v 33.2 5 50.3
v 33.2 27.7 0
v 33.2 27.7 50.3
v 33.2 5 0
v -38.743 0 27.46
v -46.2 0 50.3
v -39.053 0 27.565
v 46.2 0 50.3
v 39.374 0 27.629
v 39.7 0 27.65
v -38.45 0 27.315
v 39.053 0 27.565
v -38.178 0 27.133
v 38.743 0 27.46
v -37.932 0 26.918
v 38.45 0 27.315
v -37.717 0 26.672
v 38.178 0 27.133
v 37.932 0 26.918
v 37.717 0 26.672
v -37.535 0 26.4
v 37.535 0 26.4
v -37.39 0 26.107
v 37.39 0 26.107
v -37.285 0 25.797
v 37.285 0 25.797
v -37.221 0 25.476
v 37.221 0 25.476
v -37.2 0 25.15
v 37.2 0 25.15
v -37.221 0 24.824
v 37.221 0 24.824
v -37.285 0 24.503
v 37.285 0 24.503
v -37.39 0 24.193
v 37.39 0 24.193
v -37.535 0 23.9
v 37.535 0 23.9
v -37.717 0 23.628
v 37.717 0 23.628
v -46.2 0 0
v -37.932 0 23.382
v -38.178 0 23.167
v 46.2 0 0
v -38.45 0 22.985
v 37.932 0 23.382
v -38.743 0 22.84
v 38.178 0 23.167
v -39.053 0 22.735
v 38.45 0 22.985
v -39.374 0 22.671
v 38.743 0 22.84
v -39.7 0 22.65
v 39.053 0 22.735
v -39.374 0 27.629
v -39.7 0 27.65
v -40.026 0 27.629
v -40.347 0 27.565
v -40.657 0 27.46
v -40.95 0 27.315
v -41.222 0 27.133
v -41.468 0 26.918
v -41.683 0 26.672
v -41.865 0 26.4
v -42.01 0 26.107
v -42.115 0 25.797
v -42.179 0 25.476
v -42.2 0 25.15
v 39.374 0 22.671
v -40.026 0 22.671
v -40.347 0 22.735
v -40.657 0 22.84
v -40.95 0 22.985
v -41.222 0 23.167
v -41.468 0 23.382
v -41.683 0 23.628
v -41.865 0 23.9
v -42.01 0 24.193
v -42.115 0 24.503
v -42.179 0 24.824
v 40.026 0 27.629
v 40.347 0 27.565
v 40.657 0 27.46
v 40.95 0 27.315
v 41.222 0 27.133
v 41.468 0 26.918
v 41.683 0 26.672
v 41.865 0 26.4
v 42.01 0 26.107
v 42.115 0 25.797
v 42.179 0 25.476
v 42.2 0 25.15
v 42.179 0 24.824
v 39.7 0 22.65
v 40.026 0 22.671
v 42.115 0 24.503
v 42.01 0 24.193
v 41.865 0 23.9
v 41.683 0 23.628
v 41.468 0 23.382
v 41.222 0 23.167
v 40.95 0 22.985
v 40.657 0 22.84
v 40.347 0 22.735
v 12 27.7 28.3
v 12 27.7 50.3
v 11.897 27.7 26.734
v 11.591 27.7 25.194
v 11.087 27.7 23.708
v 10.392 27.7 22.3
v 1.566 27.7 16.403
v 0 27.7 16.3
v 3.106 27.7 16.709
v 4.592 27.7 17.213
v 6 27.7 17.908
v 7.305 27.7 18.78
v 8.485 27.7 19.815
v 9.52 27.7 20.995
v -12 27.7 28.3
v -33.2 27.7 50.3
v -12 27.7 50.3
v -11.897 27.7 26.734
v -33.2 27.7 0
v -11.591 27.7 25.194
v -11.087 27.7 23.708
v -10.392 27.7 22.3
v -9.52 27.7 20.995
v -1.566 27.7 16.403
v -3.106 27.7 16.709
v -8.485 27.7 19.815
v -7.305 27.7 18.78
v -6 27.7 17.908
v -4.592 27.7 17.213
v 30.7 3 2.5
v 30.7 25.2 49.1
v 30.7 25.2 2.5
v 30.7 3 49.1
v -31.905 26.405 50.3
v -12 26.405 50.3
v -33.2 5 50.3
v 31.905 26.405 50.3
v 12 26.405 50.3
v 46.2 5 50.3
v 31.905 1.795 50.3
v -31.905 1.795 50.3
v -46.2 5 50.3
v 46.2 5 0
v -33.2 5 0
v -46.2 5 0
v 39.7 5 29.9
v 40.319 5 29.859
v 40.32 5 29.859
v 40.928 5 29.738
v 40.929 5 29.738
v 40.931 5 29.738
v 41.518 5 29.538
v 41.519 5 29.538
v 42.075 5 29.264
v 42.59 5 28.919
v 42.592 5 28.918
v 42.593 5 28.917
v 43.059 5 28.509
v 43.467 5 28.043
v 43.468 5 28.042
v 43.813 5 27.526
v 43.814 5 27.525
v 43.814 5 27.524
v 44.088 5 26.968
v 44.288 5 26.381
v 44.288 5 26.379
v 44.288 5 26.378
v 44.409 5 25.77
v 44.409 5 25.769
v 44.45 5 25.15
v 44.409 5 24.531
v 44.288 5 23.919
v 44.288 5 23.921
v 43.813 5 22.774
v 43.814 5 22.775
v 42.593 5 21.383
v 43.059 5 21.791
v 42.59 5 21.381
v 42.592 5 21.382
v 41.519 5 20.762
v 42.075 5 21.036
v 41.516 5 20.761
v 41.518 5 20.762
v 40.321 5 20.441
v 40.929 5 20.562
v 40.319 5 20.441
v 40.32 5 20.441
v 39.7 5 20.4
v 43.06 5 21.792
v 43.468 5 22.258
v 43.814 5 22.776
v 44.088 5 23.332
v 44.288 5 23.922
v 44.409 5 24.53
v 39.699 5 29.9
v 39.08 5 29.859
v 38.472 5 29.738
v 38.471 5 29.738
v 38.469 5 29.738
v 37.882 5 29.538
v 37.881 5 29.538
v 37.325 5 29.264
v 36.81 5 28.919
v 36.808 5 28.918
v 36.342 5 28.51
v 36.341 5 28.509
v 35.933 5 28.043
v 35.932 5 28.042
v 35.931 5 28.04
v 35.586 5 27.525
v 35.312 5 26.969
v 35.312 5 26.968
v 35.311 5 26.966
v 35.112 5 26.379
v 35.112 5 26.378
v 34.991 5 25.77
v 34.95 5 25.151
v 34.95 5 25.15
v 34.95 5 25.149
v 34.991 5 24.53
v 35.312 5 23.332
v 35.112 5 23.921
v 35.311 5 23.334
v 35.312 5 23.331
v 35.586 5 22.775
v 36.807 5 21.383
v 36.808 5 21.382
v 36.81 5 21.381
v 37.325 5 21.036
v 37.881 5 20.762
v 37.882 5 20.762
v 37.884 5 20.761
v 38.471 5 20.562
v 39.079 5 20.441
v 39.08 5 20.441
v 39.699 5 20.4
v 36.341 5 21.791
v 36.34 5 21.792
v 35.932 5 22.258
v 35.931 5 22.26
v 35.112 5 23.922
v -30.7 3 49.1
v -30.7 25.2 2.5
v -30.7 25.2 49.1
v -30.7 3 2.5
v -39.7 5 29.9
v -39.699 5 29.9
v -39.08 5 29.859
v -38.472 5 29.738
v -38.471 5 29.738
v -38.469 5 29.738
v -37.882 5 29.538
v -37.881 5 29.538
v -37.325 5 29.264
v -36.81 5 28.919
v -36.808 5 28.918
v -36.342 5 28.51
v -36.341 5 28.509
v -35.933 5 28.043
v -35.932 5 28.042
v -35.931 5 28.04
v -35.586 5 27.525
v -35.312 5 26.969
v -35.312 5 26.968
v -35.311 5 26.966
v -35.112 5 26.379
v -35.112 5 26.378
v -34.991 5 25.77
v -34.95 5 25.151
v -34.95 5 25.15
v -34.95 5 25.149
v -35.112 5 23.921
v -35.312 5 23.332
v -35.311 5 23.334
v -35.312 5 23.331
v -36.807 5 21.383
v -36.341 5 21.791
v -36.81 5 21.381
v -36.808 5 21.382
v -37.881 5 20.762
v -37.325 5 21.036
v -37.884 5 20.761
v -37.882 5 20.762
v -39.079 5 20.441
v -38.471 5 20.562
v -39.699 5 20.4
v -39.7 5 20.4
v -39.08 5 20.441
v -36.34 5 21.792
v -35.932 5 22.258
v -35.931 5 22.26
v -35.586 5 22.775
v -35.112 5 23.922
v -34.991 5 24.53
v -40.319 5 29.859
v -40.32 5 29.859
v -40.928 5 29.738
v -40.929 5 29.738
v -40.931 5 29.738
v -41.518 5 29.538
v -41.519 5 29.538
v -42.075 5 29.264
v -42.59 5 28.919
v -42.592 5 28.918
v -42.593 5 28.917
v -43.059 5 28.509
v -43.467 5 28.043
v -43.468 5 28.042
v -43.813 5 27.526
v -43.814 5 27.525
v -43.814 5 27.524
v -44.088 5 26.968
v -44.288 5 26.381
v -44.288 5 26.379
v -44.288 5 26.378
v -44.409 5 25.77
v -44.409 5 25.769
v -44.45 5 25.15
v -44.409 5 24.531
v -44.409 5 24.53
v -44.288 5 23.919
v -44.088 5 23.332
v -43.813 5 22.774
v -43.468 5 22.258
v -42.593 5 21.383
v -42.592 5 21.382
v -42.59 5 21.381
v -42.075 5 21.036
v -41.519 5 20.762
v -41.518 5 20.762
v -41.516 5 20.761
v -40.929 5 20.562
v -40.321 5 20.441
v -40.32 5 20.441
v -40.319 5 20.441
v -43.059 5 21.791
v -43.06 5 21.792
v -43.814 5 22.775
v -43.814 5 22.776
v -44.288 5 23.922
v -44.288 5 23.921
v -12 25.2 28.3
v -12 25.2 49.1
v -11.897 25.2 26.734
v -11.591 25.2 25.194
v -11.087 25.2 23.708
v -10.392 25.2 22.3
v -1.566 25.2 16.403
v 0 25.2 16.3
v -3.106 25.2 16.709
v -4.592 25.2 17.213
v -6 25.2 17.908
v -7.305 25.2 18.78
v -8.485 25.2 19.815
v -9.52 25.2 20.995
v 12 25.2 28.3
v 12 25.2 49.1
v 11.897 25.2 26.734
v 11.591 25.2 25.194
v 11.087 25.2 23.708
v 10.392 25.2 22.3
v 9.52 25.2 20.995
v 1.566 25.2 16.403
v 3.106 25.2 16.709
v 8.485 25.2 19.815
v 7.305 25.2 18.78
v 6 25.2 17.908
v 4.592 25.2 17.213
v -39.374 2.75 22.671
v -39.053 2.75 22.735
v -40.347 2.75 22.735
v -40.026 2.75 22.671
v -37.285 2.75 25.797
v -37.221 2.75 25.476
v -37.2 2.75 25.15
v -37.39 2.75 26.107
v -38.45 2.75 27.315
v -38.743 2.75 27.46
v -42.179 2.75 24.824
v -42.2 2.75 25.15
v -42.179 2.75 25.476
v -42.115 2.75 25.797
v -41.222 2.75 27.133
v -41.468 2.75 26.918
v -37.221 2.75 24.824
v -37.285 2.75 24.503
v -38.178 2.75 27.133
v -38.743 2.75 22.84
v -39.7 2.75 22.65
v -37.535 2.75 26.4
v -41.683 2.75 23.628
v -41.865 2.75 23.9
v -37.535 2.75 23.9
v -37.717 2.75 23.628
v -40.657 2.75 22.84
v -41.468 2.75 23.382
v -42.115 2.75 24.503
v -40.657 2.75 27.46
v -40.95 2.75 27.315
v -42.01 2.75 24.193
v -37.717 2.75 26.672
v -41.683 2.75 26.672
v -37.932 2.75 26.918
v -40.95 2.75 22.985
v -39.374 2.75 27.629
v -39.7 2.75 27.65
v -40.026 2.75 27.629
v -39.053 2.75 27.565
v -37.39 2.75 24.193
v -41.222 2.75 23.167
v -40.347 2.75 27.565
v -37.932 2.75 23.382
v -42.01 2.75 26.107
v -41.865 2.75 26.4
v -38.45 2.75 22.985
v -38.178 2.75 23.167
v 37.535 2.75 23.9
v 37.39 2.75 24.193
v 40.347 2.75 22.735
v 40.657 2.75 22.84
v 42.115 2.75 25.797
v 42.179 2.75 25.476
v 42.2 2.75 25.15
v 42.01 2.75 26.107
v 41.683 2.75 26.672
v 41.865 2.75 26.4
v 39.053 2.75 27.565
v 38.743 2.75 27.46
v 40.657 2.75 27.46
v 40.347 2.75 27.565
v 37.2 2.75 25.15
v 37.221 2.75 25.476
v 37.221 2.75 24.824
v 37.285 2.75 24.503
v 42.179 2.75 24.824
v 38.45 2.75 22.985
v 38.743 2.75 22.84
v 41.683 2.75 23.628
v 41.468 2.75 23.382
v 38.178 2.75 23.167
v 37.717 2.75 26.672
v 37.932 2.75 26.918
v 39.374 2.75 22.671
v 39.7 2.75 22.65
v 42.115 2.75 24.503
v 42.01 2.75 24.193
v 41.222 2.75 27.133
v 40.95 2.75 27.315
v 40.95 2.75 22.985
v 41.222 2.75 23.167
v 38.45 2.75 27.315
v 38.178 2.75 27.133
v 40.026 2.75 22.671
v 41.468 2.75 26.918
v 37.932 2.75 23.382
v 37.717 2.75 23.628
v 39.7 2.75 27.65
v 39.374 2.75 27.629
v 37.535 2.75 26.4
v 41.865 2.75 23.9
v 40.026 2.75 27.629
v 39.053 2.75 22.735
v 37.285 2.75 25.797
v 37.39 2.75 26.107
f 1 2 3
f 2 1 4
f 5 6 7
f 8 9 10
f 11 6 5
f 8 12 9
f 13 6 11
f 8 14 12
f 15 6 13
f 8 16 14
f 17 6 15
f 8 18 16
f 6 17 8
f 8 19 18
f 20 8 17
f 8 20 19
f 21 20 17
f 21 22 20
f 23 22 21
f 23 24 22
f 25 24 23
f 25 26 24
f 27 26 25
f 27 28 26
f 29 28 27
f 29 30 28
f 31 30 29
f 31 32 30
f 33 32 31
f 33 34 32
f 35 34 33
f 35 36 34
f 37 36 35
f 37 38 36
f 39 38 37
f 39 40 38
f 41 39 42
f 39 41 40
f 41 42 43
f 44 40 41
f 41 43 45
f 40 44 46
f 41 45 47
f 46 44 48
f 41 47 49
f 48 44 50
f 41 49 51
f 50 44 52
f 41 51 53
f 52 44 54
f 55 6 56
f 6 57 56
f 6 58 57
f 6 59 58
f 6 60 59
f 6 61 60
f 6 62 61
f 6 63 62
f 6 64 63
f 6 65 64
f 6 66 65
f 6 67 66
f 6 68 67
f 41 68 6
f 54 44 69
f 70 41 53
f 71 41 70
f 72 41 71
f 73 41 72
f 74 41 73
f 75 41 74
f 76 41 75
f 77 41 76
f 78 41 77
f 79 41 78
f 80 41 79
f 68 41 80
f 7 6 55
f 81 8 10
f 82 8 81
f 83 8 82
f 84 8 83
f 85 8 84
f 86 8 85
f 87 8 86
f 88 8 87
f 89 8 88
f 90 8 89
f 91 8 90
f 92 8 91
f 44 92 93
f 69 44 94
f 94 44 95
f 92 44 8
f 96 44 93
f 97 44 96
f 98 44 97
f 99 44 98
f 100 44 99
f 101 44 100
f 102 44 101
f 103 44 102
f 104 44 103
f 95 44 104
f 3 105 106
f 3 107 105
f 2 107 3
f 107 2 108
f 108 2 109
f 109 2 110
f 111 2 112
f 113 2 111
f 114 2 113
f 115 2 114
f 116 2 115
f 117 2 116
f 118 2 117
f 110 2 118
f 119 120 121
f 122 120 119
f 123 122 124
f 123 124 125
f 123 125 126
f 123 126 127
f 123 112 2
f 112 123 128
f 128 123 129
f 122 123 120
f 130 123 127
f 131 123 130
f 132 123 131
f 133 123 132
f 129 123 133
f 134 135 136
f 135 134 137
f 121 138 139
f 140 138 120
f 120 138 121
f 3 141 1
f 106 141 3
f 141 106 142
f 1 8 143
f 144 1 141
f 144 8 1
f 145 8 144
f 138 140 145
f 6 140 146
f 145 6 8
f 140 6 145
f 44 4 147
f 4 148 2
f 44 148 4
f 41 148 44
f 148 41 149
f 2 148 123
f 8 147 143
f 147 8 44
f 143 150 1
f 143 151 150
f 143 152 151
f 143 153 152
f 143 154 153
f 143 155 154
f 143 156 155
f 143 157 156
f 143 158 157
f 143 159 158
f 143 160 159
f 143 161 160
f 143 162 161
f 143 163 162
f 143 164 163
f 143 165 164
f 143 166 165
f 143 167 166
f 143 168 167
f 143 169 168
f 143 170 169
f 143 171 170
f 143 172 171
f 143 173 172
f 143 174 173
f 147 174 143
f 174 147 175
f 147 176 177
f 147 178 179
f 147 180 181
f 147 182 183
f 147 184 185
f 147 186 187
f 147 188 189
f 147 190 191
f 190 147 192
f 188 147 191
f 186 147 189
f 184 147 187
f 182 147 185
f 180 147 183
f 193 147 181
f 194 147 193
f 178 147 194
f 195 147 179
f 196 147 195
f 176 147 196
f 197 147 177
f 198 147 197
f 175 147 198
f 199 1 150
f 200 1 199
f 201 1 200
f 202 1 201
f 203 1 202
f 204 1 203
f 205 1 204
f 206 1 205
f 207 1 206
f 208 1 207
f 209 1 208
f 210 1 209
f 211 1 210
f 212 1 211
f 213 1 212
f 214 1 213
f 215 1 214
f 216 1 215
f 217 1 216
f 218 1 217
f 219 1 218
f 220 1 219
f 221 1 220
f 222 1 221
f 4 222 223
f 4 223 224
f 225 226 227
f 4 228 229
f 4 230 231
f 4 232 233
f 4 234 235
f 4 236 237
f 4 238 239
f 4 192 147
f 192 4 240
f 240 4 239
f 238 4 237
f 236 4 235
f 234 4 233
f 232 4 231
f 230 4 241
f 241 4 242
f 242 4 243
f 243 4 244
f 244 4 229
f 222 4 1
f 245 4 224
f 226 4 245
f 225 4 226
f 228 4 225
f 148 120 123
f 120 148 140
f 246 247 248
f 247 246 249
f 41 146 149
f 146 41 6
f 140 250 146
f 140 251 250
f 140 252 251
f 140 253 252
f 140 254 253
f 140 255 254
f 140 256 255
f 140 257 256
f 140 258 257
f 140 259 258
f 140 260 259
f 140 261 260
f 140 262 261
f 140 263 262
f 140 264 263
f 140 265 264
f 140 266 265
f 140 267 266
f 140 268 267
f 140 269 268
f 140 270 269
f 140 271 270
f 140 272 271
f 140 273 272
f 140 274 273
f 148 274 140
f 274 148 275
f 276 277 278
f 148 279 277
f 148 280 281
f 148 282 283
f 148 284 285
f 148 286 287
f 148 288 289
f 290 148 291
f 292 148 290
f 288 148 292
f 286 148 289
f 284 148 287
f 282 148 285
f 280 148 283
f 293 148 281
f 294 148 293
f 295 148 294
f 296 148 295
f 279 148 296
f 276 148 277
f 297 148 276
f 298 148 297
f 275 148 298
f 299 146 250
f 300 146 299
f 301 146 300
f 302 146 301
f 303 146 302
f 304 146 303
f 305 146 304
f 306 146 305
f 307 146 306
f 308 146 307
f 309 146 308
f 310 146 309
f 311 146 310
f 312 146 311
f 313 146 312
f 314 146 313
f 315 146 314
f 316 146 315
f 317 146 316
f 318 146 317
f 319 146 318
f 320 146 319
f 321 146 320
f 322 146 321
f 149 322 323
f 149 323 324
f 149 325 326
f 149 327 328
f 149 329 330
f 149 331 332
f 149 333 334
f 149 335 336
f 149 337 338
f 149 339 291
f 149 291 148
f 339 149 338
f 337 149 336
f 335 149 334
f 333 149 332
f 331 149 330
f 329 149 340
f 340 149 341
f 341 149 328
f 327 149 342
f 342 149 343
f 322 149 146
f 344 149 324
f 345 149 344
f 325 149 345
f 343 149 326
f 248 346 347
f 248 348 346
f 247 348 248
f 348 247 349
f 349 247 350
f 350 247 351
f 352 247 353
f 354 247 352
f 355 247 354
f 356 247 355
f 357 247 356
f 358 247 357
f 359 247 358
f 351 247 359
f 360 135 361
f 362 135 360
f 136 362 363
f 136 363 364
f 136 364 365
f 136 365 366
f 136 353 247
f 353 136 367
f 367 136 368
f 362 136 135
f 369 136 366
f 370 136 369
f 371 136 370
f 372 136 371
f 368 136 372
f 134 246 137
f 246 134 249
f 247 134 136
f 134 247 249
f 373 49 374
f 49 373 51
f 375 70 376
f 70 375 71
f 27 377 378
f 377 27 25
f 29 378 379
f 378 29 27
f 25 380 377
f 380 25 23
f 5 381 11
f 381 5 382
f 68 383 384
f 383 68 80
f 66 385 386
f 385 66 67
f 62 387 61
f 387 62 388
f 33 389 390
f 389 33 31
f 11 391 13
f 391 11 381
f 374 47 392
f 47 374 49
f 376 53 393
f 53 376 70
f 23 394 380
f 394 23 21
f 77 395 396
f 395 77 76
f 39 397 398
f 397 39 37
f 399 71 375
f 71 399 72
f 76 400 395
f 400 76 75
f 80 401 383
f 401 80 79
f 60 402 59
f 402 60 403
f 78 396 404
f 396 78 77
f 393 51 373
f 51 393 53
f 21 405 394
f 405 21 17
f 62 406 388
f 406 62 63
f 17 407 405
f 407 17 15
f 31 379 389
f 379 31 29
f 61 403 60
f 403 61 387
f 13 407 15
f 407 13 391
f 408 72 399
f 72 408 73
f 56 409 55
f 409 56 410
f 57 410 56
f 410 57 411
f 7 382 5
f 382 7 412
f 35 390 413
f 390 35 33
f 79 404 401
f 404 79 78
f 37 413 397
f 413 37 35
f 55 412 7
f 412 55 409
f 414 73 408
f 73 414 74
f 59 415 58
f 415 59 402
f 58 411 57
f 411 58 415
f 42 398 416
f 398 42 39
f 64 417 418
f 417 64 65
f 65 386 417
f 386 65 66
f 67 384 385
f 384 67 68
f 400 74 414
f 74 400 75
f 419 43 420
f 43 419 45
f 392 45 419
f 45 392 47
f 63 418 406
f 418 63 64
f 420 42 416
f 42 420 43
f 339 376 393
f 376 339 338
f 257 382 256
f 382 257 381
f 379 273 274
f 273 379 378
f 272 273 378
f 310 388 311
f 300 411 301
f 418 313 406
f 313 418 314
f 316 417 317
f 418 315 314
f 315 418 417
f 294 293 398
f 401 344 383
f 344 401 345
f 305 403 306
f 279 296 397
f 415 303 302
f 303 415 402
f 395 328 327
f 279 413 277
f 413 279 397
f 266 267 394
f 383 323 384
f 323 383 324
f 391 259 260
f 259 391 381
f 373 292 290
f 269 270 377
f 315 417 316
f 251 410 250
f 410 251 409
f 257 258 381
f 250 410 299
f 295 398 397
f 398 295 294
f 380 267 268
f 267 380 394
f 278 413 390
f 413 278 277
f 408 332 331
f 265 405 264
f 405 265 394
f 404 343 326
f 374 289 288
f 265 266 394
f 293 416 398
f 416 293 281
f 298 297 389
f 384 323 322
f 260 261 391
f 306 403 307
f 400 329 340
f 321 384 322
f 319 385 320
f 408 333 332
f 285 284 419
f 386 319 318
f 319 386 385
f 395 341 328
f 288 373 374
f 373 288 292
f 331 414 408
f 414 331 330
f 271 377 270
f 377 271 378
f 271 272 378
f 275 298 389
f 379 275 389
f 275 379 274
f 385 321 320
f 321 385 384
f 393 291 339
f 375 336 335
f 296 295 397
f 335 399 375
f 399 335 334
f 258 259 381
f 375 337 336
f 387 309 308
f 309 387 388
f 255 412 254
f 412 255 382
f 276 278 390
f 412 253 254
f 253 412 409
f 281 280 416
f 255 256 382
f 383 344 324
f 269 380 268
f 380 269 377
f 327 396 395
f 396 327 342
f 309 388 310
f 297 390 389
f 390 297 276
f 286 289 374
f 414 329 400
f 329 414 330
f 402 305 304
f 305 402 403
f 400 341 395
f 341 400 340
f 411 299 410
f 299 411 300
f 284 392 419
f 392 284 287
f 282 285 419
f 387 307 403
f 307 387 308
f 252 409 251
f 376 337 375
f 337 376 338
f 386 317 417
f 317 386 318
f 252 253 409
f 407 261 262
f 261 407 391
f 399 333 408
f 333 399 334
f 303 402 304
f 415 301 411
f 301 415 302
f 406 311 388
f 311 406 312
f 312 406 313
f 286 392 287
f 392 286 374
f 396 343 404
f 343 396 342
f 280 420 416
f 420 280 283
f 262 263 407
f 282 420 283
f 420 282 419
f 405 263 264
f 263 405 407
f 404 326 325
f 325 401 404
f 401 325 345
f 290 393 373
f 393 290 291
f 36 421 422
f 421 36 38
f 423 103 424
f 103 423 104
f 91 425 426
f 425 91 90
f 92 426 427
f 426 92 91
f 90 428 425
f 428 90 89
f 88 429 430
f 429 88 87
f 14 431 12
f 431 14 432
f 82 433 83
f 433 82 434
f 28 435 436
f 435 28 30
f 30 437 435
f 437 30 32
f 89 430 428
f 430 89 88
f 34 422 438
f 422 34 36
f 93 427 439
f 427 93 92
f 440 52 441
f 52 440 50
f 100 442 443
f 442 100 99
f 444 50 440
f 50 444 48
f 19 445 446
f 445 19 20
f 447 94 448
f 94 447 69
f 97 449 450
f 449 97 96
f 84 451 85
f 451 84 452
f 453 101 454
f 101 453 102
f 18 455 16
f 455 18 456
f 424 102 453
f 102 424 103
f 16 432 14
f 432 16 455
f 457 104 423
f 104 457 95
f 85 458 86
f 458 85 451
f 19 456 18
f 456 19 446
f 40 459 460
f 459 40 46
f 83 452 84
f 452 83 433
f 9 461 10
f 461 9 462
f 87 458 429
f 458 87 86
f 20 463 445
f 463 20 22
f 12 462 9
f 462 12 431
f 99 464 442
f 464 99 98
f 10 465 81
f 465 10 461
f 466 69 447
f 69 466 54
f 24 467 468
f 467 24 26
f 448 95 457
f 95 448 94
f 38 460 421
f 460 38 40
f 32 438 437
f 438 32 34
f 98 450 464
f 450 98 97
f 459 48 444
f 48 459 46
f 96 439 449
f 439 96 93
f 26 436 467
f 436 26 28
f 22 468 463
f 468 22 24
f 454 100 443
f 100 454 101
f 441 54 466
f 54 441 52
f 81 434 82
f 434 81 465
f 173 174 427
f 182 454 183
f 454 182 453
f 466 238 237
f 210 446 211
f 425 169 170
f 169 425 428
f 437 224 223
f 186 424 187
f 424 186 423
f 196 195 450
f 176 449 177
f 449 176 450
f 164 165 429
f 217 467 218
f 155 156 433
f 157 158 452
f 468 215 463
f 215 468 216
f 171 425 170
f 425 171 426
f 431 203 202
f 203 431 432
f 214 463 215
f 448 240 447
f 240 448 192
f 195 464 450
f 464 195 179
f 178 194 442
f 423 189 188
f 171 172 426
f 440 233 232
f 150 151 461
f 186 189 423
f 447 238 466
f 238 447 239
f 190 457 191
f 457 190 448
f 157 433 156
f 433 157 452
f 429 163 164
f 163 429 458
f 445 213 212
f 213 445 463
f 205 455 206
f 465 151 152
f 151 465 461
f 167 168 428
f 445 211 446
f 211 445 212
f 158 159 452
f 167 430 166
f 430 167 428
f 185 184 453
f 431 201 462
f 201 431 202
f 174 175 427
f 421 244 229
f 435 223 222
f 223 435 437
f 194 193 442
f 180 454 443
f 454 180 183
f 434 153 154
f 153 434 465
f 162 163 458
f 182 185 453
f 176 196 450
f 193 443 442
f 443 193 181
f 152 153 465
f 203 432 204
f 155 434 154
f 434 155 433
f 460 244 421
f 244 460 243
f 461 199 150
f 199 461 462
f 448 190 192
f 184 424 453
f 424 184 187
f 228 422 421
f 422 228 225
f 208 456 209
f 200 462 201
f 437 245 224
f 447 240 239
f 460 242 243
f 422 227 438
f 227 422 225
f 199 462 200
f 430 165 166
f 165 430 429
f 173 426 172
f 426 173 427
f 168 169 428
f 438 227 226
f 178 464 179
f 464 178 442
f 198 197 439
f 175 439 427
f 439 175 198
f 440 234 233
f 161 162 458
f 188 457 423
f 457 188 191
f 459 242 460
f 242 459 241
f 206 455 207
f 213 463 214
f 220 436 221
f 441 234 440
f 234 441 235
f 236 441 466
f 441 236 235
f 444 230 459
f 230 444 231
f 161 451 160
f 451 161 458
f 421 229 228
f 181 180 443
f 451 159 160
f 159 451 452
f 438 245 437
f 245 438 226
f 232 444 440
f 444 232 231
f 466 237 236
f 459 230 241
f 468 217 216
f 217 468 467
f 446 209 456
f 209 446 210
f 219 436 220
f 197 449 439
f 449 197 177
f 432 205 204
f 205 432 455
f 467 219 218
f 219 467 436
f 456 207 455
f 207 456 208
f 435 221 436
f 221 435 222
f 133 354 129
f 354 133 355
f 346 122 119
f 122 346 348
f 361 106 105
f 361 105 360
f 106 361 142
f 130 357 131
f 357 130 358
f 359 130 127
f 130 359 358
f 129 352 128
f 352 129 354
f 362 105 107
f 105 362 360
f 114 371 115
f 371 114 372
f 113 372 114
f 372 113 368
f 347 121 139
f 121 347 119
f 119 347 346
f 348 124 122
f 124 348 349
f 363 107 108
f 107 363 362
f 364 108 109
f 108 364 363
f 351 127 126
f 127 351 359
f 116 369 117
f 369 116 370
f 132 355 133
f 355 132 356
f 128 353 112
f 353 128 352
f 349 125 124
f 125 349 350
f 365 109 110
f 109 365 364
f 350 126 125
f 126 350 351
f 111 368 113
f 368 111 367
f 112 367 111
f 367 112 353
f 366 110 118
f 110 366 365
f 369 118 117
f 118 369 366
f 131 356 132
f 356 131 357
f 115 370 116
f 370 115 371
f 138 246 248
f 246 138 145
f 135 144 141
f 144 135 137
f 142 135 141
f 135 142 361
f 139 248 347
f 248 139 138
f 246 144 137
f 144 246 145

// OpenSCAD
// ---------------------------------------------------------------------------
// Under-desk AirPods Pro case tray
//
// A shallow open-front tray that screws to the underside of a desk. The case
// lies flat, big face to the desk, and slides in and out from the front. A
// thumb notch in the floor at the mouth lets you push it back out.
//
// Lying flat is what makes this simple. Stood on end the case would have to be
// held up against gravity, which needs a snap, and a shallow socket has no
// wall length to spring with. Flat, the floor does the work and there is
// nothing to latch.
//
// Apple publishes the case as 45.2 x 60.6 x 21.7 mm but not its radii. Lying
// flat that hardly matters - a square pocket takes the case whatever its
// corners do, and the only place it shows is that the case rests on the flat
// middle of its face rather than right out at the edges, which is why the
// floor is solid rather than a pair of shelves.
//
//   x = case width, y = depth front to back, z = height, 0 = desk underside
//
// Render:  openscad -o tray.stl under_desk_airpods_holder.scad
// ---------------------------------------------------------------------------

/* [Case] Apple AirPods Pro 2 charging case, lying flat */
CASE_W = 60.6;           // left-right
CASE_D = 45.2;           // front-back once it is lying down
CASE_T = 21.7;           // thickness, which is now the depth of the tray

/* [Fit] */
GAP_SIDE = 0.4;          // snug: the case is a known size, so this can be tight
GAP_TOP  = 0.5;
GAP_BACK = 0.6;

/* [Tray] */
WALL      = 2.5;
TOP_T     = 3.0;         // the face that beds against the desk
FLOOR_T   = 2.5;         // solid: the case's face is only flat in the middle
BACK_T    = 2.5;
FRONT_LIP = 2.0;
NOTCH_W   = 24.0;        // thumb slot in the floor. Wide enough for a thumb, and
NOTCH_L   = 34.0;        // long enough to run it back behind the case and drag
                         // the case out. It costs floor: what is left either
                         // side of it is what the case actually rests on.
CHAMFER   = 1.2;         // lead-in around the mouth

/* [Mounting pads] Two, one per side, full depth. Outboard so a driver can get
   at the screws from below without reaching into the tray. */
EAR_L = 13.0;
EAR_T = 5.0;

/* [Fasteners] Two #8 or M4 flat-head wood screws */
SCREW_D    = 5.0;
HEAD_D     = 9.5;
CSK_ANGLE  = 90.0;
DRIVER_CLR = 1.5;

/* [Output] */
PRINT_ORIENTATION = true;    // laid on its back face, which is how it prints
SHOW_CASE = false;
$fn = 48;

// --------------------------- derived --------------------------------------

CAV_W = CASE_W + 2 * GAP_SIDE;
CAV_T = CASE_T + GAP_TOP;
OUT_W = CAV_W + 2 * WALL;
OUT_D = BACK_T + CASE_D + GAP_BACK + FRONT_LIP;
OUT_H = TOP_T + CAV_T + FLOOR_T;

X_CAV = CAV_W / 2;
X_OUT = OUT_W / 2;
X_EAR = X_OUT + EAR_L;
SCREW_X = X_OUT + EAR_L / 2;
SCREW_Y = OUT_D / 2;

Z_FLOOR = -(TOP_T + CAV_T);      // floor's top face = where the case rests
Z_BOT   = -OUT_H;
CSK_DEPTH = (HEAD_D - SCREW_D) / 2 / tan(CSK_ANGLE / 2);
EPS = 0.01;

assert(EAR_T > CSK_DEPTH + 1.5, "too little pad left under the countersink");
assert(SCREW_X - HEAD_D / 2 - DRIVER_CLR >= X_OUT,
       "the side wall crowds the screw heads; raise EAR_L");
assert(SCREW_X + HEAD_D / 2 < X_EAR, "the screw head overhangs the pad");
assert(NOTCH_W + 8 < CAV_W, "the thumb slot is wider than the tray");
assert((CASE_W - CASE_T - NOTCH_W) / 2 >= 4,
       "the slot leaves too little flat floor either side to rest the case on");
assert(NOTCH_L < CASE_D, "the slot runs past the back of the case");
assert(CHAMFER < WALL, "the lead-in chamfer eats the whole wall");

// --------------------------- helpers --------------------------------------

module boxc(x0, x1, y0, y1, z0, z1) {
    translate([x0, y0, z0]) cube([x1 - x0, y1 - y0, z1 - z0]);
}

// --------------------------- the part --------------------------------------

module tray() {
    difference() {
        union() {
            boxc(-X_OUT, X_OUT, 0, OUT_D, Z_FLOOR - FLOOR_T, Z_FLOOR);  // floor
            boxc(-X_OUT, X_OUT, 0, OUT_D, -TOP_T, 0);                   // top plate
            boxc(-X_OUT, X_OUT, 0, BACK_T, Z_BOT, 0);                   // back wall
            for (m = [0, 1]) mirror([m, 0, 0]) {
                boxc(X_CAV, X_OUT, 0, OUT_D, Z_BOT, 0);                 // side wall
                boxc(X_OUT, X_EAR, 0, OUT_D, -EAR_T, 0);                // mounting pad
            }
        }

        // Screws, countersunk from below.
        for (sx = [-SCREW_X, SCREW_X]) {
            translate([sx, SCREW_Y, -EAR_T - EPS])
                cylinder(h = EAR_T + 2 * EPS, d = SCREW_D);
            translate([sx, SCREW_Y, -EAR_T - EPS])
                cylinder(h = CSK_DEPTH + EPS, d1 = HEAD_D + 2 * EPS, d2 = SCREW_D);
        }

        // Thumb slot: a channel up the middle of the floor, open at the mouth,
        // so a thumb can run back along the case's underside and drag it out.
        // It opens towards the mouth and never closes again, so printed on its
        // back face there is nothing to bridge.
        hull() for (y = [OUT_D - NOTCH_L + NOTCH_W / 2, OUT_D + 1])
            translate([0, y, Z_FLOOR - FLOOR_T - EPS])
                cylinder(h = FLOOR_T + 2 * EPS, d = NOTCH_W);

        // Lead-in chamfer around the mouth.
        hull() {
            boxc(-X_CAV, X_CAV, OUT_D - CHAMFER, OUT_D - CHAMFER + EPS,
                 Z_FLOOR, -TOP_T);
            boxc(-X_CAV - CHAMFER - 1, X_CAV + CHAMFER + 1, OUT_D + 1 - EPS, OUT_D + 1,
                 Z_FLOOR - CHAMFER - 1, -TOP_T + CHAMFER + 1);
        }
    }
}

// Printed on its back face: the walls, floor and top plate all run along the
// build direction, so nothing overhangs but the countersinks.
if (PRINT_ORIENTATION) rotate([90, 0, 0]) tray();
else {
    tray();
    if (SHOW_CASE)
        %translate([-CASE_W / 2, BACK_T, Z_FLOOR]) cube([CASE_W, CASE_D, CASE_T]);
}
